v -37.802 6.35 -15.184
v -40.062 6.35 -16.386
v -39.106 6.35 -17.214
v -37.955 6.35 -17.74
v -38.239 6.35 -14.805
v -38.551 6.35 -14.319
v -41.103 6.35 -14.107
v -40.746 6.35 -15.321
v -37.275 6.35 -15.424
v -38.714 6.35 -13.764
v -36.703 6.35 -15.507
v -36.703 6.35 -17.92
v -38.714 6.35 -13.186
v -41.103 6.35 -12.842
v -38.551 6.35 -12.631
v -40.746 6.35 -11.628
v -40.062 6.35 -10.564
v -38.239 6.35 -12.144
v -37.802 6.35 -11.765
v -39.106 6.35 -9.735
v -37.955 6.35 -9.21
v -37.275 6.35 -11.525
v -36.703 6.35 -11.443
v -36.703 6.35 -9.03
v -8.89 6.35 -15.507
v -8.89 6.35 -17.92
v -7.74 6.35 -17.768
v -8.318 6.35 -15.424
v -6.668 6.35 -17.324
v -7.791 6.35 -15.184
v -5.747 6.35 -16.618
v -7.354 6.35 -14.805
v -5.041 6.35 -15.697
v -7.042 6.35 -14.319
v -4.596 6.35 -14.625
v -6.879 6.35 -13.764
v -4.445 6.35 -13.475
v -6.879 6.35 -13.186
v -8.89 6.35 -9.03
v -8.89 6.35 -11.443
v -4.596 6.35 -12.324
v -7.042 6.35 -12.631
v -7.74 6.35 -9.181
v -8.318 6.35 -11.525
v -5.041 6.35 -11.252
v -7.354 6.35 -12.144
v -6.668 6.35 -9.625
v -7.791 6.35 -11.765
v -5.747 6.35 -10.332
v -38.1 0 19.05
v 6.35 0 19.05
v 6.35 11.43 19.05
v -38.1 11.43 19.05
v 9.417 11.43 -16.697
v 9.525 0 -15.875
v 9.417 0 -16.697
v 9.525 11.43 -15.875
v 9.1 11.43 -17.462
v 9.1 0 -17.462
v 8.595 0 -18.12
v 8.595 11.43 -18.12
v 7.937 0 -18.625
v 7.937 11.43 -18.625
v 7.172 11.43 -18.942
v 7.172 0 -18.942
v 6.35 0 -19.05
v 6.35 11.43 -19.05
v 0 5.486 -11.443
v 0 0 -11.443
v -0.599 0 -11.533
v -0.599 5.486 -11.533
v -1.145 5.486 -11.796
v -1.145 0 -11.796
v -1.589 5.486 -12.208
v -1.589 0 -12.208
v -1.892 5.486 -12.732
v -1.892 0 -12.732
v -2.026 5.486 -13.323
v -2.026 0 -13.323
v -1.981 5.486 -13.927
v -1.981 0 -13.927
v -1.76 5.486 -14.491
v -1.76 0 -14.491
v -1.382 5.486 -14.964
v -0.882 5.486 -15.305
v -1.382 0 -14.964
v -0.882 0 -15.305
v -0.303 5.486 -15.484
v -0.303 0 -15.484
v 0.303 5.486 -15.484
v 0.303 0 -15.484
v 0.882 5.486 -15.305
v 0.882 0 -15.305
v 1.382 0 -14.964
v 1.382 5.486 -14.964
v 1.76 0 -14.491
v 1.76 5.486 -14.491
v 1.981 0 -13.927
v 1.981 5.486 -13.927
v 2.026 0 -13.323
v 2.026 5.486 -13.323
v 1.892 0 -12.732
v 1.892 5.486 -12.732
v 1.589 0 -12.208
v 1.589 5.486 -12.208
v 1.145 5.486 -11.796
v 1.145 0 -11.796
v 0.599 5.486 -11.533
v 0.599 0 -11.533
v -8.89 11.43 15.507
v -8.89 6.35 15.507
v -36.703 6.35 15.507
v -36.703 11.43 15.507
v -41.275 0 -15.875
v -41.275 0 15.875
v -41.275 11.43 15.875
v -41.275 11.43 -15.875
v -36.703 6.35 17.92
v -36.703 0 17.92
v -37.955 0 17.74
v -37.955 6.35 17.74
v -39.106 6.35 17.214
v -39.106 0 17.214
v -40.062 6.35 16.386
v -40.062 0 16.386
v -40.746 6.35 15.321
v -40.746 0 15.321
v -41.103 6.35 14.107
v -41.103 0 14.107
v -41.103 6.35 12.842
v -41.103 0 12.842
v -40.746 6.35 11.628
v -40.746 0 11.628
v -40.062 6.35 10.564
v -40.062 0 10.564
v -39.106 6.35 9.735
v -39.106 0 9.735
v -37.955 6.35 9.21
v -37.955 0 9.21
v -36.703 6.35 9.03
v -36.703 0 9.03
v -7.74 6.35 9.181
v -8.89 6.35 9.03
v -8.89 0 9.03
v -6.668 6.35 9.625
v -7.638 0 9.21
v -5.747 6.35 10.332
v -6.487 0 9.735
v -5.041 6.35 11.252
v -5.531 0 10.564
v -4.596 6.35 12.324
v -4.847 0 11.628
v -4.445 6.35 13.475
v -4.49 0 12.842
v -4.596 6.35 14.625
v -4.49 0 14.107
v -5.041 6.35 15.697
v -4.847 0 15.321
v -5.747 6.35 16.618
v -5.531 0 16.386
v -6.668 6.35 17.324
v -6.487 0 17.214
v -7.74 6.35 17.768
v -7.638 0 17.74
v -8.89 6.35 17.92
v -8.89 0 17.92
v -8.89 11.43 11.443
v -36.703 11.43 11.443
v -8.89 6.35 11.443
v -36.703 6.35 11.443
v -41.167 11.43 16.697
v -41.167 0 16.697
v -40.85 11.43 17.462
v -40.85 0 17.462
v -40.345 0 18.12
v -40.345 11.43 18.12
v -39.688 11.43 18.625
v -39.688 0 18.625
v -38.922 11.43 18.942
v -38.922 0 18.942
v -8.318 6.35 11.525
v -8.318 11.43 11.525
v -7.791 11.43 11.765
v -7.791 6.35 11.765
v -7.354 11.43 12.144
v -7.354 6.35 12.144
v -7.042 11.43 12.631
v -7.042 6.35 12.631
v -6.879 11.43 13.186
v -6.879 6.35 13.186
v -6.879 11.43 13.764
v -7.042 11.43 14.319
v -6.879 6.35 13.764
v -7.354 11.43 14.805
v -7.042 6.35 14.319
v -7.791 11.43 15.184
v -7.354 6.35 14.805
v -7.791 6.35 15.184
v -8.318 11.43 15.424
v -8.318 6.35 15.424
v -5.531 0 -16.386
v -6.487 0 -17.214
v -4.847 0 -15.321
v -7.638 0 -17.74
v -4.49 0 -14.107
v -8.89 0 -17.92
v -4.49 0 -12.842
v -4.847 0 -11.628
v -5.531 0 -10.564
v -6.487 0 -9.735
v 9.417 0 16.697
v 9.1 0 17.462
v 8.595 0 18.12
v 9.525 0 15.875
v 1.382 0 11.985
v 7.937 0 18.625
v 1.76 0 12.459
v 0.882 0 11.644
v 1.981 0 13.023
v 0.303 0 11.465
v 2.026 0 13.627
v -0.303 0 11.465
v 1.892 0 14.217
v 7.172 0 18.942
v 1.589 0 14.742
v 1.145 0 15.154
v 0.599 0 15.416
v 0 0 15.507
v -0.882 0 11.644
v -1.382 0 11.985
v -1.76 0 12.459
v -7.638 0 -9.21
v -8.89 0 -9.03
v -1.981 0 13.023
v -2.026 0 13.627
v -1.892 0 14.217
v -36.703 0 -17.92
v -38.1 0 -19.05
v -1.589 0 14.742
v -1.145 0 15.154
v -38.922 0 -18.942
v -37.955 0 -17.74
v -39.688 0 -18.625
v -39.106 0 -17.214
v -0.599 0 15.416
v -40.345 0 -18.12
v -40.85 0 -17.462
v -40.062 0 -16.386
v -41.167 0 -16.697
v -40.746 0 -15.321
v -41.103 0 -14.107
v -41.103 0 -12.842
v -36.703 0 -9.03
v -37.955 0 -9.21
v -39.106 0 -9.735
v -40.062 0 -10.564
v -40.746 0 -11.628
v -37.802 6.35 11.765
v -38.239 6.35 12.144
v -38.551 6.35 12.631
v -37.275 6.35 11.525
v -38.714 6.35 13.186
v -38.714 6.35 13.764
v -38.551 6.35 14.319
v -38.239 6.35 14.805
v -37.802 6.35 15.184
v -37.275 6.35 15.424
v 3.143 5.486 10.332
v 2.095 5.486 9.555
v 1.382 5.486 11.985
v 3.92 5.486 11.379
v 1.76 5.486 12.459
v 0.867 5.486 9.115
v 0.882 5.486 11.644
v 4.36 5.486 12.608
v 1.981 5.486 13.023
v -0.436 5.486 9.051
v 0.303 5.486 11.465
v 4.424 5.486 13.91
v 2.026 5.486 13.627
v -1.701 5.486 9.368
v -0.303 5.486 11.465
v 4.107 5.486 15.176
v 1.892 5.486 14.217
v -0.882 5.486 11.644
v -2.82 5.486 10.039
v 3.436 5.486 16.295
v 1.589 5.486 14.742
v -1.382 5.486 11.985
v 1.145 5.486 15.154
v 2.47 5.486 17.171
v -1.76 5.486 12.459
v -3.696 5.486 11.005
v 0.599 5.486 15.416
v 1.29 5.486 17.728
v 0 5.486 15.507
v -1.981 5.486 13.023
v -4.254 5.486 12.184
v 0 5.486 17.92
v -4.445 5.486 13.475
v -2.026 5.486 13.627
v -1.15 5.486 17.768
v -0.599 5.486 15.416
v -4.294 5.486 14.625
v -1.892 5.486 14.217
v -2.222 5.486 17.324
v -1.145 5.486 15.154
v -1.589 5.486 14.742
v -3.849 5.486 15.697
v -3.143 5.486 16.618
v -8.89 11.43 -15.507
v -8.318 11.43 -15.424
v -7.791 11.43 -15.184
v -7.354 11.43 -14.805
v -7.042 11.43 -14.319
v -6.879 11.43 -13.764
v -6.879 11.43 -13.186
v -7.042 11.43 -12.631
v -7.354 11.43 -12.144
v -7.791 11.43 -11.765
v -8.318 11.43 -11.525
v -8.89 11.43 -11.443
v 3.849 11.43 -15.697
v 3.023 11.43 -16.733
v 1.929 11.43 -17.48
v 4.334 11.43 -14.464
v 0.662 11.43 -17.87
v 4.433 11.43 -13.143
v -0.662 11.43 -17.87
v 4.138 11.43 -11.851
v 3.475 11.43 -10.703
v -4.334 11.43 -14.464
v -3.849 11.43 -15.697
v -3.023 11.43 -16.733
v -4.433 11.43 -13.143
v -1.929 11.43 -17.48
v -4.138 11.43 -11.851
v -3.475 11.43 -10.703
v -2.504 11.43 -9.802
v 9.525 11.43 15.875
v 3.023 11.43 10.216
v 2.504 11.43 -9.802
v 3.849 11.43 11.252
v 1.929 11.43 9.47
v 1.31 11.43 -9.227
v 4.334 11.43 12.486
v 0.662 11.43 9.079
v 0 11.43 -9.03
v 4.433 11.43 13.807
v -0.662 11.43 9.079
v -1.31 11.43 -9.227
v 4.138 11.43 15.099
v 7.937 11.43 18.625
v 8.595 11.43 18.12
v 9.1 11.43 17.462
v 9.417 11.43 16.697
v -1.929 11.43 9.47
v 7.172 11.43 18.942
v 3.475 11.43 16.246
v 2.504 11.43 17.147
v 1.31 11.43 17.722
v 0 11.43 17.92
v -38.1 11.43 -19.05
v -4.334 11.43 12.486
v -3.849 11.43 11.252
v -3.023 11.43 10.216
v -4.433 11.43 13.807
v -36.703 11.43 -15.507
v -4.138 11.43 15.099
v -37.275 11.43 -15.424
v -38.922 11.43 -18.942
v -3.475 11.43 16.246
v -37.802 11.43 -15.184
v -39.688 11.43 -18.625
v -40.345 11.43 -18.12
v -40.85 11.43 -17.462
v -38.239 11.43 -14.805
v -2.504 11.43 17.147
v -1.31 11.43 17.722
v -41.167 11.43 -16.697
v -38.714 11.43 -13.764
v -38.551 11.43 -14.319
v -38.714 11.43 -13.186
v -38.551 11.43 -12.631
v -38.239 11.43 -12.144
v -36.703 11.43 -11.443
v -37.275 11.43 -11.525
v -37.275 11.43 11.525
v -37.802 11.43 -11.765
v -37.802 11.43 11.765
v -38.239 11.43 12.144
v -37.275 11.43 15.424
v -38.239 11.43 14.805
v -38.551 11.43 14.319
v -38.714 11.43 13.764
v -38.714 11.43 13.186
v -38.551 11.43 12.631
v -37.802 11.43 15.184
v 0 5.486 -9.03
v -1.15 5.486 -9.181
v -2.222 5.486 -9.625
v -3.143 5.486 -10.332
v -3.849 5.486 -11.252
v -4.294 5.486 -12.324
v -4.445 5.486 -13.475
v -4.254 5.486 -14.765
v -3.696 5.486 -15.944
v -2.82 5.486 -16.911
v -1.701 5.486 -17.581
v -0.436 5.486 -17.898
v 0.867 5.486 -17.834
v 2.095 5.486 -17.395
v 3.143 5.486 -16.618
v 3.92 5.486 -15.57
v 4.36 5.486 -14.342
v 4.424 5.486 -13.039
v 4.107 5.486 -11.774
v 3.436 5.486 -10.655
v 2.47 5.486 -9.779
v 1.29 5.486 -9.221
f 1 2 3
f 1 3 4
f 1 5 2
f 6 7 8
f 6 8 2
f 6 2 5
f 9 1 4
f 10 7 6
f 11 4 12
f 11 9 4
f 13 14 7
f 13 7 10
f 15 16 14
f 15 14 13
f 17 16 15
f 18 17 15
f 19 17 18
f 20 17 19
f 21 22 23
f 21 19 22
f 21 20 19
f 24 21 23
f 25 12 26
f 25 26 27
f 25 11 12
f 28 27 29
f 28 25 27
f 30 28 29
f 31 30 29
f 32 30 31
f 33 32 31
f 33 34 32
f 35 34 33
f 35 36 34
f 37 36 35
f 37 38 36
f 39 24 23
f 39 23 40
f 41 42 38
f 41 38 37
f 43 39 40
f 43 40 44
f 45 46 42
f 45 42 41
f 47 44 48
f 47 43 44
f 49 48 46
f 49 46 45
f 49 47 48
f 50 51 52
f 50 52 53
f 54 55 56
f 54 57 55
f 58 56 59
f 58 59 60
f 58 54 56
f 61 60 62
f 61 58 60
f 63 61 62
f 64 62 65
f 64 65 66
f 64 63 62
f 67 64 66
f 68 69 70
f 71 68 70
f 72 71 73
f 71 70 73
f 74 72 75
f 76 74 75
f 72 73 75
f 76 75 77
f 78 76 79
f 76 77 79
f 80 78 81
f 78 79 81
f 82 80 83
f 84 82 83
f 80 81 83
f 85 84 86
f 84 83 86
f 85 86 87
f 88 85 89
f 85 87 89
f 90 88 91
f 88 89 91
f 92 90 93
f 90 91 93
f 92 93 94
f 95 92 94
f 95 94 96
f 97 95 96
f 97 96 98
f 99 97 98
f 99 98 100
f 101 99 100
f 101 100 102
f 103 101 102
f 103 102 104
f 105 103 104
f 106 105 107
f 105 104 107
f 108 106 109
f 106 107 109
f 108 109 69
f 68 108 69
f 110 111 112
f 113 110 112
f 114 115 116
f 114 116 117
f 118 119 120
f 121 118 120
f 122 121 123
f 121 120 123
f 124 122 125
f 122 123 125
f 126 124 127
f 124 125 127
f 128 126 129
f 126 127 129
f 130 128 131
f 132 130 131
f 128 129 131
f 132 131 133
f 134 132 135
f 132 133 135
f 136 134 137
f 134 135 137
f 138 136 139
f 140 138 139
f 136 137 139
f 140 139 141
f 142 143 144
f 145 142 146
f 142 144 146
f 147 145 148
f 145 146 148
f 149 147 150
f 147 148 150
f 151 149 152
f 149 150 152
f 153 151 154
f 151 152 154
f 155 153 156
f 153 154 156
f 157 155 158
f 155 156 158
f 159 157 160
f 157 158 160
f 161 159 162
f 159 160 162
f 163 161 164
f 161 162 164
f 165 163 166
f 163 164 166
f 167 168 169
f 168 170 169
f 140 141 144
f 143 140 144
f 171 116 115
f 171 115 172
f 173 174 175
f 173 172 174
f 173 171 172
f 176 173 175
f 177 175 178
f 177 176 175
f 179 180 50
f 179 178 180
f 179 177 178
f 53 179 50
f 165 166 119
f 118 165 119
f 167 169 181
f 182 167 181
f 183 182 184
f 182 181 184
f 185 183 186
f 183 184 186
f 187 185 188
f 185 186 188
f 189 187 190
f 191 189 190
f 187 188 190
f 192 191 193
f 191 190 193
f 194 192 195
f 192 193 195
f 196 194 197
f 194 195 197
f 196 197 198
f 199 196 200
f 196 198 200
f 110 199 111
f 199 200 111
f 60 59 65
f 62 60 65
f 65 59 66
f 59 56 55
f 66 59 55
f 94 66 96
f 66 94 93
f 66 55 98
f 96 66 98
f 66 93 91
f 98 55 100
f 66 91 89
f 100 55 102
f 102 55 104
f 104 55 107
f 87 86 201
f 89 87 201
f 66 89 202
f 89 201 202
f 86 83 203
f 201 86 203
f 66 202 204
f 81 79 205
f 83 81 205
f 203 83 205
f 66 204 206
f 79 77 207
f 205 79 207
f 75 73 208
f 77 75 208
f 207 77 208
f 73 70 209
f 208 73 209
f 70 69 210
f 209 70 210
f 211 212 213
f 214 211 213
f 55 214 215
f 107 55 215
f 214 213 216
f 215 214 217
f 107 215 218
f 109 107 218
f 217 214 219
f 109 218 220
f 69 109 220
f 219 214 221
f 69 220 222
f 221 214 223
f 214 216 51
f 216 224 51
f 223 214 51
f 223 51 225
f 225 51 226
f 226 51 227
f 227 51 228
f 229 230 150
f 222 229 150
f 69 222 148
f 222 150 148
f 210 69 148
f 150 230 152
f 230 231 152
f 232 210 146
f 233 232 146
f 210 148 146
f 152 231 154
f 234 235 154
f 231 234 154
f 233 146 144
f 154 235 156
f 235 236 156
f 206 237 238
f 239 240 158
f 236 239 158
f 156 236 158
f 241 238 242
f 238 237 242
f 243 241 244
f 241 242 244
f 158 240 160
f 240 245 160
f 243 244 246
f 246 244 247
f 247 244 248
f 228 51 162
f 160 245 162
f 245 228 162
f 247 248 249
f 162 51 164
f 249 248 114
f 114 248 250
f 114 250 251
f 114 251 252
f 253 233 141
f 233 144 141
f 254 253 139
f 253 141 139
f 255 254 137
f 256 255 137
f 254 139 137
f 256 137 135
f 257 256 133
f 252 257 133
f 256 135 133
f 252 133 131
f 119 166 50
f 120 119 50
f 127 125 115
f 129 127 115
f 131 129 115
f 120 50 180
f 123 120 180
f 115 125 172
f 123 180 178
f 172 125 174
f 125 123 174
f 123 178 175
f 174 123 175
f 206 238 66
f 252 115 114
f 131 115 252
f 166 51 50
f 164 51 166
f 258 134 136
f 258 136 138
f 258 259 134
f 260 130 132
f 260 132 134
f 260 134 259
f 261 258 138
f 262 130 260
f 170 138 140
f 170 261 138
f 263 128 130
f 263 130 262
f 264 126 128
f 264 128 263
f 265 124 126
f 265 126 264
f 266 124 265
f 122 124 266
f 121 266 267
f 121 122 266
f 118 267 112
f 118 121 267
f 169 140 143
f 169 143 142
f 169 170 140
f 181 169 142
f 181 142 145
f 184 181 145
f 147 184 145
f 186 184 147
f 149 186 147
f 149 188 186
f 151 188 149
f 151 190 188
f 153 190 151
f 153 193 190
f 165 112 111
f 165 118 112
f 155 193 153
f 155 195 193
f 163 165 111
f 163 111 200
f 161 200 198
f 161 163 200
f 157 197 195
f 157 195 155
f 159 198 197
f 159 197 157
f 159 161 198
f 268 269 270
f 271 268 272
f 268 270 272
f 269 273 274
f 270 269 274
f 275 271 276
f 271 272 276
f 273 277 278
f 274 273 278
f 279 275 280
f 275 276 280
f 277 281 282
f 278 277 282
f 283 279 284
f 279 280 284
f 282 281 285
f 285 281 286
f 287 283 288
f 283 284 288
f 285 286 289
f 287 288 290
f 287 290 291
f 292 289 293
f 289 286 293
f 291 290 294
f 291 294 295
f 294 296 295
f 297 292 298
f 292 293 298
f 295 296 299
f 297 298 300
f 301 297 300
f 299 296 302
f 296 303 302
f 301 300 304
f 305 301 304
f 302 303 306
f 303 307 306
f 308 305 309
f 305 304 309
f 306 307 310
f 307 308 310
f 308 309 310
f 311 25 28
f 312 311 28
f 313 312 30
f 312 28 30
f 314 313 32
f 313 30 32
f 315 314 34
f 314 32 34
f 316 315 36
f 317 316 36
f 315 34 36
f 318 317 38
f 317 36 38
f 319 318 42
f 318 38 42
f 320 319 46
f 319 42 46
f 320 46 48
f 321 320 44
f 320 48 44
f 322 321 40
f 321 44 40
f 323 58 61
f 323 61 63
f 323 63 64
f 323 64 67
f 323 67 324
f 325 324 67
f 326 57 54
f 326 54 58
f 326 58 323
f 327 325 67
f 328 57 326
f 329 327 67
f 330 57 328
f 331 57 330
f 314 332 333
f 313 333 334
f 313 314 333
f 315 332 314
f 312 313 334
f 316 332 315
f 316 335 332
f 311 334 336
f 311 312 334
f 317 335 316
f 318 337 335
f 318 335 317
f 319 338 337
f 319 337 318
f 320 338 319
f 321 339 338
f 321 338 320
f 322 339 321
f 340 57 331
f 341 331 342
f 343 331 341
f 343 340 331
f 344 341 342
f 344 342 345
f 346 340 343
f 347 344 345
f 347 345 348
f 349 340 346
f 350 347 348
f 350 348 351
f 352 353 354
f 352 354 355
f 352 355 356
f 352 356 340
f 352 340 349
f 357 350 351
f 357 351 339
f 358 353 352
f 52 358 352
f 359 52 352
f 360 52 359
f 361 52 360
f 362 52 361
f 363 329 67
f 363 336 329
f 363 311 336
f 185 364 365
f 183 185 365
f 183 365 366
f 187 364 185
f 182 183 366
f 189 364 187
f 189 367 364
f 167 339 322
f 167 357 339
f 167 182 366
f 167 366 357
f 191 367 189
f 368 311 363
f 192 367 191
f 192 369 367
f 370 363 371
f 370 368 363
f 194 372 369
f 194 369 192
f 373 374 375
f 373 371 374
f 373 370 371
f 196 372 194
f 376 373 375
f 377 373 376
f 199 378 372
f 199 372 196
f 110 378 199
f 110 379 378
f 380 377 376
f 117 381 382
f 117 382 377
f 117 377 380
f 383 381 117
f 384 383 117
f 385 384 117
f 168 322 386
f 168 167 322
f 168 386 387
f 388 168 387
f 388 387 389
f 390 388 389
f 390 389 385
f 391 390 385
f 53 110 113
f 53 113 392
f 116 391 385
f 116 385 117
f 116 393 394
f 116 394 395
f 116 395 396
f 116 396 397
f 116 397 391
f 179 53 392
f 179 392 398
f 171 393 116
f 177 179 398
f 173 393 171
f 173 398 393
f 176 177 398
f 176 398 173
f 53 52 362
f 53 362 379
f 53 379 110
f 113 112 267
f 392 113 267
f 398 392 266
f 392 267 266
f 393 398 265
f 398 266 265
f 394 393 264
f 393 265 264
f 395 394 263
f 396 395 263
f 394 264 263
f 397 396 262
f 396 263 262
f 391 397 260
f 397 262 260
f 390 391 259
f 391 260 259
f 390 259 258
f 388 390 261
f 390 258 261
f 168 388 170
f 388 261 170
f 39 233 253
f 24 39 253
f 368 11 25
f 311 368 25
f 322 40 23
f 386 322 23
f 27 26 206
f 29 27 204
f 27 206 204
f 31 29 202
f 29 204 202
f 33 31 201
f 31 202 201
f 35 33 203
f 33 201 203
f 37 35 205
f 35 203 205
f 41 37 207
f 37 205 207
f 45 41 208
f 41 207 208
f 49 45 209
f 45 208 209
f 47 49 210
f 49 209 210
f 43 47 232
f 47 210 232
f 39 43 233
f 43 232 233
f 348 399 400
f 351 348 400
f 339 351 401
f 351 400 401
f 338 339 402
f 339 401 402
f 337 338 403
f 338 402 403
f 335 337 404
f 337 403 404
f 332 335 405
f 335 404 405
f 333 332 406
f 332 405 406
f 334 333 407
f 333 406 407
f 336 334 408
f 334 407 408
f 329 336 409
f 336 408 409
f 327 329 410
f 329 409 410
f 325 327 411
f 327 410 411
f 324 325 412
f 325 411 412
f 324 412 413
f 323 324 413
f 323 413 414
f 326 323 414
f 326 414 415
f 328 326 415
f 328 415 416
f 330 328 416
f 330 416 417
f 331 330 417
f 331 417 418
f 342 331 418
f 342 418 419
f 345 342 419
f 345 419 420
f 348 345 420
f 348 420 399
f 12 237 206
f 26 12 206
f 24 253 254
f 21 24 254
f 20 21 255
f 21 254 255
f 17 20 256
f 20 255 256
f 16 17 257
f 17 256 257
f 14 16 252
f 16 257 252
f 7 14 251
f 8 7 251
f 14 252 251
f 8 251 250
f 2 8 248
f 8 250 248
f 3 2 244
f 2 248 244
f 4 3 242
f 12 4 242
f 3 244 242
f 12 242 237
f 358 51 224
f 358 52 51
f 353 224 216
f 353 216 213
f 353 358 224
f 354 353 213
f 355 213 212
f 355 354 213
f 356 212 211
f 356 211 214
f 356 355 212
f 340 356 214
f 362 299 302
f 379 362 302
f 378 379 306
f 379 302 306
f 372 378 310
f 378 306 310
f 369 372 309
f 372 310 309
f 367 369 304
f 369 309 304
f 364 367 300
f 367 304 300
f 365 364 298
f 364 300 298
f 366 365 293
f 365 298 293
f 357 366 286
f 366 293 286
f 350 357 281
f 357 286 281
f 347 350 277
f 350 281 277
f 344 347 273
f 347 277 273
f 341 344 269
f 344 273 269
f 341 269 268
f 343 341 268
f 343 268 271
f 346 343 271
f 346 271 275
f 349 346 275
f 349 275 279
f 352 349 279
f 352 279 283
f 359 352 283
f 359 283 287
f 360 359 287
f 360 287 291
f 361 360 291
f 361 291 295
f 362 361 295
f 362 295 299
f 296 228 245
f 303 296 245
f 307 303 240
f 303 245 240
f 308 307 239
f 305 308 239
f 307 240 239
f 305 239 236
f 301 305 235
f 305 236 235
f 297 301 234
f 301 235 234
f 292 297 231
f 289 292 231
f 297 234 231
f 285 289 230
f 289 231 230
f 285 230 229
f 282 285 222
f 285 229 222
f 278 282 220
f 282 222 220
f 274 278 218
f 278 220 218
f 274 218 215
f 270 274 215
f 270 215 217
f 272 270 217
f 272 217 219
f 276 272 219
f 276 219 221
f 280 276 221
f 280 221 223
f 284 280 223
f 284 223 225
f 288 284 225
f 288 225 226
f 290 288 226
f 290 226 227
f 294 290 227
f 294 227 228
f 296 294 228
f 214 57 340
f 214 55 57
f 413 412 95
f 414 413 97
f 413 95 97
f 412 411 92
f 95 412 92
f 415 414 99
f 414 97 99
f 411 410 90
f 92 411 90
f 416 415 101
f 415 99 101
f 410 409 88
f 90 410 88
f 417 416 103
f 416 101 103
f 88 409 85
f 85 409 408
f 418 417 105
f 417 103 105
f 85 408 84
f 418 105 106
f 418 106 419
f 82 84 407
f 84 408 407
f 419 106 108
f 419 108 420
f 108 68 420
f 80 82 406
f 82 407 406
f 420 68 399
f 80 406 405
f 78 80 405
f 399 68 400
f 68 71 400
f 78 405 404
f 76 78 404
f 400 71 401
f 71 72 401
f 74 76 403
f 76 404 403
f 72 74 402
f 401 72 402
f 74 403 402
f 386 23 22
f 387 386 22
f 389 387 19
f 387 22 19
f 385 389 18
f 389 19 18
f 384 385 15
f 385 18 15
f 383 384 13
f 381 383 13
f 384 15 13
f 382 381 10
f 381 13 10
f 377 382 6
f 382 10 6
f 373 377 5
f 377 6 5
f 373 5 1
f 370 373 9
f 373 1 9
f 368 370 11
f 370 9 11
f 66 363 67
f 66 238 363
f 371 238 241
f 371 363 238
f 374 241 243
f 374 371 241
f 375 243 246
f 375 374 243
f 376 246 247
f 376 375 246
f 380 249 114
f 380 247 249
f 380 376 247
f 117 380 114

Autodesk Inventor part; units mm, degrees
ref_plane "XZ Plane" through (0, 0, 0) normal (0, 1, 0) x (-1, 0, 0)
ref_plane "XY Plane" through (0, 0, 0) normal (0, 0, 1) x (1, 0, 0)
sketch "Sketch1" plane through (0, 0, 0) normal (0, 1, 0) x (-1, 0, 0)
  line L0 (-9.525, 19.05) -> (41.275, 19.05)
  line L1 (41.275, 19.05) -> (41.275, -19.05)
  line L2 (41.275, -19.05) -> (-9.525, -19.05)
  line L3 (-9.525, -19.05) -> (-9.525, 19.05)
  point P0 (0, 0)
  dimension "d0" = 50.8
  dimension "d1" = 38.1
  dimension "d3" = 9.525
  dimension "d4" = 19.05
extrude "Extrusion1" add sketch "Sketch1" along normal blind 11.43
sketch "Sketch2" plane through (0, 11.43, 0) normal (0, 1, 0) x (1, 0, 0)
  line L0 (9.525, -19.05) -> (9.525, 19.05) projected
  point P0 (0, 0)
  point P1 (0, -13.4747)
  point P2 (0, 13.4747)
  dimension "d7" = 26.9494
  dimension "d9" = 9.525
  dimension "d10" = 9.525
  dimension "d11" = 13.4747
hole "Hole1" at (0, 11.43, 13.4747) at (0, 11.43, -13.4747) direction (0, -1, 0) diameter 4.064 end through all counterbore diameter 8.89 counterbore depth 5.9436
sketch "Sketch3" plane through (0, 0, 0) normal (0, -1, 0) x (1, 0, 0)
  circle A0 centre (0, -13.4747) radius 2.032 projected
  circle A1 centre (0, 13.4747) radius 2.032 projected
  line L0 (-41.275, -19.05) -> (-41.275, 19.05) projected
  line L1 (-36.703, -13.4747) -> (-8.89, -13.4747) construction
  line L2 (-36.703, -15.5067) -> (-8.89, -15.5067)
  line L3 (-8.89, -11.4427) -> (-36.703, -11.4427)
  arc A2 (-36.703, -11.4427) -> (-36.703, -15.5067) centre (-36.703, -13.4747) ccw
  arc A3 (-8.89, -15.5067) -> (-8.89, -11.4427) centre (-8.89, -13.4747) ccw
  line L4 (-36.703, 13.4747) -> (-8.89, 13.4747) construction
  line L5 (-36.703, 11.4427) -> (-8.89, 11.4427)
  line L6 (-8.89, 15.5067) -> (-36.703, 15.5067)
  arc A4 (-36.703, 15.5067) -> (-36.703, 11.4427) centre (-36.703, 13.4747) ccw
  arc A5 (-8.89, 11.4427) -> (-8.89, 15.5067) centre (-8.89, 13.4747) ccw
  point P0 (0, 0)
  point P1 (-22.7965, -13.4747)
  point P2 (-22.7965, 13.4747)
  dimension "d19" = 26.9494
  dimension "d20" = 13.4747
  dimension "d21" = 8.89
  dimension "d22" = 8.89
  dimension "d23" = 4.572
  dimension "d24" = 4.572
  dimension "d25" = 4.064
  dimension "d26" = 4.064
extrude "Extrusion2" cut sketch "Sketch3" against normal through all contours A2 L3 A3 L2 | A4 L6 A5 L5
sketch "Sketch4" plane through (0, 0, 0) normal (0, -1, 0) x (1, 0, 0)
  arc A0 (-36.703, 15.5067) -> (-36.703, 11.4427) centre (-36.703, 13.4747) ccw projected
  arc A1 (-8.89, 11.4427) -> (-8.89, 15.5067) centre (-8.89, 13.4747) ccw projected
  line L0 (-36.703, 13.4747) -> (-8.89, 13.4747) construction
  line L1 (-36.703, 9.0297) -> (-8.89, 9.0297)
  line L2 (-8.89, 17.9197) -> (-36.703, 17.9197)
  arc A2 (-36.703, 17.9197) -> (-36.703, 9.0297) centre (-36.703, 13.4747) ccw
  arc A3 (-8.89, 9.0297) -> (-8.89, 17.9197) centre (-8.89, 13.4747) ccw
  arc A4 (-8.89, -15.5067) -> (-8.89, -11.4427) centre (-8.89, -13.4747) ccw projected
  arc A5 (-36.703, -11.4427) -> (-36.703, -15.5067) centre (-36.703, -13.4747) ccw projected
  line L3 (-8.89, -13.4747) -> (-36.703, -13.4747) construction
  line L4 (-8.89, -9.0297) -> (-36.703, -9.0297)
  line L5 (-36.703, -17.9197) -> (-8.89, -17.9197)
  arc A6 (-8.89, -17.9197) -> (-8.89, -9.0297) centre (-8.89, -13.4747) ccw
  arc A7 (-36.703, -9.0297) -> (-36.703, -17.9197) centre (-36.703, -13.4747) ccw
  point P0 (0, 0)
  point P1 (-22.7965, 13.4747)
  point P2 (-22.7965, -13.4747)
  dimension "d29" = 8.89
  dimension "d30" = 8.89
extrude "Extrusion3" cut sketch "Sketch4" against normal blind 6.35
fillet "Fillet1" radius 3.175 4 edges at (9.525, 5.715, 19.05) (9.525, 5.715, -19.05) (-41.275, 5.715, 19.05) (-41.275, 5.715, -19.05)
equation "\"d4\" = 0.5 * d1"
equation "\"d9\" = d3"
equation "\"d10\" = d9"
equation "\"d11\" = 0.5 * d7"
equation "\"d20\" = 0.5 * d19"
equation "\"d22\" = d21"
equation "\"d24\" = d23"
equation "\"d26\" = d25"
equation "\"d30\" = d29"
properties part number "intake wheel only to xrail"
